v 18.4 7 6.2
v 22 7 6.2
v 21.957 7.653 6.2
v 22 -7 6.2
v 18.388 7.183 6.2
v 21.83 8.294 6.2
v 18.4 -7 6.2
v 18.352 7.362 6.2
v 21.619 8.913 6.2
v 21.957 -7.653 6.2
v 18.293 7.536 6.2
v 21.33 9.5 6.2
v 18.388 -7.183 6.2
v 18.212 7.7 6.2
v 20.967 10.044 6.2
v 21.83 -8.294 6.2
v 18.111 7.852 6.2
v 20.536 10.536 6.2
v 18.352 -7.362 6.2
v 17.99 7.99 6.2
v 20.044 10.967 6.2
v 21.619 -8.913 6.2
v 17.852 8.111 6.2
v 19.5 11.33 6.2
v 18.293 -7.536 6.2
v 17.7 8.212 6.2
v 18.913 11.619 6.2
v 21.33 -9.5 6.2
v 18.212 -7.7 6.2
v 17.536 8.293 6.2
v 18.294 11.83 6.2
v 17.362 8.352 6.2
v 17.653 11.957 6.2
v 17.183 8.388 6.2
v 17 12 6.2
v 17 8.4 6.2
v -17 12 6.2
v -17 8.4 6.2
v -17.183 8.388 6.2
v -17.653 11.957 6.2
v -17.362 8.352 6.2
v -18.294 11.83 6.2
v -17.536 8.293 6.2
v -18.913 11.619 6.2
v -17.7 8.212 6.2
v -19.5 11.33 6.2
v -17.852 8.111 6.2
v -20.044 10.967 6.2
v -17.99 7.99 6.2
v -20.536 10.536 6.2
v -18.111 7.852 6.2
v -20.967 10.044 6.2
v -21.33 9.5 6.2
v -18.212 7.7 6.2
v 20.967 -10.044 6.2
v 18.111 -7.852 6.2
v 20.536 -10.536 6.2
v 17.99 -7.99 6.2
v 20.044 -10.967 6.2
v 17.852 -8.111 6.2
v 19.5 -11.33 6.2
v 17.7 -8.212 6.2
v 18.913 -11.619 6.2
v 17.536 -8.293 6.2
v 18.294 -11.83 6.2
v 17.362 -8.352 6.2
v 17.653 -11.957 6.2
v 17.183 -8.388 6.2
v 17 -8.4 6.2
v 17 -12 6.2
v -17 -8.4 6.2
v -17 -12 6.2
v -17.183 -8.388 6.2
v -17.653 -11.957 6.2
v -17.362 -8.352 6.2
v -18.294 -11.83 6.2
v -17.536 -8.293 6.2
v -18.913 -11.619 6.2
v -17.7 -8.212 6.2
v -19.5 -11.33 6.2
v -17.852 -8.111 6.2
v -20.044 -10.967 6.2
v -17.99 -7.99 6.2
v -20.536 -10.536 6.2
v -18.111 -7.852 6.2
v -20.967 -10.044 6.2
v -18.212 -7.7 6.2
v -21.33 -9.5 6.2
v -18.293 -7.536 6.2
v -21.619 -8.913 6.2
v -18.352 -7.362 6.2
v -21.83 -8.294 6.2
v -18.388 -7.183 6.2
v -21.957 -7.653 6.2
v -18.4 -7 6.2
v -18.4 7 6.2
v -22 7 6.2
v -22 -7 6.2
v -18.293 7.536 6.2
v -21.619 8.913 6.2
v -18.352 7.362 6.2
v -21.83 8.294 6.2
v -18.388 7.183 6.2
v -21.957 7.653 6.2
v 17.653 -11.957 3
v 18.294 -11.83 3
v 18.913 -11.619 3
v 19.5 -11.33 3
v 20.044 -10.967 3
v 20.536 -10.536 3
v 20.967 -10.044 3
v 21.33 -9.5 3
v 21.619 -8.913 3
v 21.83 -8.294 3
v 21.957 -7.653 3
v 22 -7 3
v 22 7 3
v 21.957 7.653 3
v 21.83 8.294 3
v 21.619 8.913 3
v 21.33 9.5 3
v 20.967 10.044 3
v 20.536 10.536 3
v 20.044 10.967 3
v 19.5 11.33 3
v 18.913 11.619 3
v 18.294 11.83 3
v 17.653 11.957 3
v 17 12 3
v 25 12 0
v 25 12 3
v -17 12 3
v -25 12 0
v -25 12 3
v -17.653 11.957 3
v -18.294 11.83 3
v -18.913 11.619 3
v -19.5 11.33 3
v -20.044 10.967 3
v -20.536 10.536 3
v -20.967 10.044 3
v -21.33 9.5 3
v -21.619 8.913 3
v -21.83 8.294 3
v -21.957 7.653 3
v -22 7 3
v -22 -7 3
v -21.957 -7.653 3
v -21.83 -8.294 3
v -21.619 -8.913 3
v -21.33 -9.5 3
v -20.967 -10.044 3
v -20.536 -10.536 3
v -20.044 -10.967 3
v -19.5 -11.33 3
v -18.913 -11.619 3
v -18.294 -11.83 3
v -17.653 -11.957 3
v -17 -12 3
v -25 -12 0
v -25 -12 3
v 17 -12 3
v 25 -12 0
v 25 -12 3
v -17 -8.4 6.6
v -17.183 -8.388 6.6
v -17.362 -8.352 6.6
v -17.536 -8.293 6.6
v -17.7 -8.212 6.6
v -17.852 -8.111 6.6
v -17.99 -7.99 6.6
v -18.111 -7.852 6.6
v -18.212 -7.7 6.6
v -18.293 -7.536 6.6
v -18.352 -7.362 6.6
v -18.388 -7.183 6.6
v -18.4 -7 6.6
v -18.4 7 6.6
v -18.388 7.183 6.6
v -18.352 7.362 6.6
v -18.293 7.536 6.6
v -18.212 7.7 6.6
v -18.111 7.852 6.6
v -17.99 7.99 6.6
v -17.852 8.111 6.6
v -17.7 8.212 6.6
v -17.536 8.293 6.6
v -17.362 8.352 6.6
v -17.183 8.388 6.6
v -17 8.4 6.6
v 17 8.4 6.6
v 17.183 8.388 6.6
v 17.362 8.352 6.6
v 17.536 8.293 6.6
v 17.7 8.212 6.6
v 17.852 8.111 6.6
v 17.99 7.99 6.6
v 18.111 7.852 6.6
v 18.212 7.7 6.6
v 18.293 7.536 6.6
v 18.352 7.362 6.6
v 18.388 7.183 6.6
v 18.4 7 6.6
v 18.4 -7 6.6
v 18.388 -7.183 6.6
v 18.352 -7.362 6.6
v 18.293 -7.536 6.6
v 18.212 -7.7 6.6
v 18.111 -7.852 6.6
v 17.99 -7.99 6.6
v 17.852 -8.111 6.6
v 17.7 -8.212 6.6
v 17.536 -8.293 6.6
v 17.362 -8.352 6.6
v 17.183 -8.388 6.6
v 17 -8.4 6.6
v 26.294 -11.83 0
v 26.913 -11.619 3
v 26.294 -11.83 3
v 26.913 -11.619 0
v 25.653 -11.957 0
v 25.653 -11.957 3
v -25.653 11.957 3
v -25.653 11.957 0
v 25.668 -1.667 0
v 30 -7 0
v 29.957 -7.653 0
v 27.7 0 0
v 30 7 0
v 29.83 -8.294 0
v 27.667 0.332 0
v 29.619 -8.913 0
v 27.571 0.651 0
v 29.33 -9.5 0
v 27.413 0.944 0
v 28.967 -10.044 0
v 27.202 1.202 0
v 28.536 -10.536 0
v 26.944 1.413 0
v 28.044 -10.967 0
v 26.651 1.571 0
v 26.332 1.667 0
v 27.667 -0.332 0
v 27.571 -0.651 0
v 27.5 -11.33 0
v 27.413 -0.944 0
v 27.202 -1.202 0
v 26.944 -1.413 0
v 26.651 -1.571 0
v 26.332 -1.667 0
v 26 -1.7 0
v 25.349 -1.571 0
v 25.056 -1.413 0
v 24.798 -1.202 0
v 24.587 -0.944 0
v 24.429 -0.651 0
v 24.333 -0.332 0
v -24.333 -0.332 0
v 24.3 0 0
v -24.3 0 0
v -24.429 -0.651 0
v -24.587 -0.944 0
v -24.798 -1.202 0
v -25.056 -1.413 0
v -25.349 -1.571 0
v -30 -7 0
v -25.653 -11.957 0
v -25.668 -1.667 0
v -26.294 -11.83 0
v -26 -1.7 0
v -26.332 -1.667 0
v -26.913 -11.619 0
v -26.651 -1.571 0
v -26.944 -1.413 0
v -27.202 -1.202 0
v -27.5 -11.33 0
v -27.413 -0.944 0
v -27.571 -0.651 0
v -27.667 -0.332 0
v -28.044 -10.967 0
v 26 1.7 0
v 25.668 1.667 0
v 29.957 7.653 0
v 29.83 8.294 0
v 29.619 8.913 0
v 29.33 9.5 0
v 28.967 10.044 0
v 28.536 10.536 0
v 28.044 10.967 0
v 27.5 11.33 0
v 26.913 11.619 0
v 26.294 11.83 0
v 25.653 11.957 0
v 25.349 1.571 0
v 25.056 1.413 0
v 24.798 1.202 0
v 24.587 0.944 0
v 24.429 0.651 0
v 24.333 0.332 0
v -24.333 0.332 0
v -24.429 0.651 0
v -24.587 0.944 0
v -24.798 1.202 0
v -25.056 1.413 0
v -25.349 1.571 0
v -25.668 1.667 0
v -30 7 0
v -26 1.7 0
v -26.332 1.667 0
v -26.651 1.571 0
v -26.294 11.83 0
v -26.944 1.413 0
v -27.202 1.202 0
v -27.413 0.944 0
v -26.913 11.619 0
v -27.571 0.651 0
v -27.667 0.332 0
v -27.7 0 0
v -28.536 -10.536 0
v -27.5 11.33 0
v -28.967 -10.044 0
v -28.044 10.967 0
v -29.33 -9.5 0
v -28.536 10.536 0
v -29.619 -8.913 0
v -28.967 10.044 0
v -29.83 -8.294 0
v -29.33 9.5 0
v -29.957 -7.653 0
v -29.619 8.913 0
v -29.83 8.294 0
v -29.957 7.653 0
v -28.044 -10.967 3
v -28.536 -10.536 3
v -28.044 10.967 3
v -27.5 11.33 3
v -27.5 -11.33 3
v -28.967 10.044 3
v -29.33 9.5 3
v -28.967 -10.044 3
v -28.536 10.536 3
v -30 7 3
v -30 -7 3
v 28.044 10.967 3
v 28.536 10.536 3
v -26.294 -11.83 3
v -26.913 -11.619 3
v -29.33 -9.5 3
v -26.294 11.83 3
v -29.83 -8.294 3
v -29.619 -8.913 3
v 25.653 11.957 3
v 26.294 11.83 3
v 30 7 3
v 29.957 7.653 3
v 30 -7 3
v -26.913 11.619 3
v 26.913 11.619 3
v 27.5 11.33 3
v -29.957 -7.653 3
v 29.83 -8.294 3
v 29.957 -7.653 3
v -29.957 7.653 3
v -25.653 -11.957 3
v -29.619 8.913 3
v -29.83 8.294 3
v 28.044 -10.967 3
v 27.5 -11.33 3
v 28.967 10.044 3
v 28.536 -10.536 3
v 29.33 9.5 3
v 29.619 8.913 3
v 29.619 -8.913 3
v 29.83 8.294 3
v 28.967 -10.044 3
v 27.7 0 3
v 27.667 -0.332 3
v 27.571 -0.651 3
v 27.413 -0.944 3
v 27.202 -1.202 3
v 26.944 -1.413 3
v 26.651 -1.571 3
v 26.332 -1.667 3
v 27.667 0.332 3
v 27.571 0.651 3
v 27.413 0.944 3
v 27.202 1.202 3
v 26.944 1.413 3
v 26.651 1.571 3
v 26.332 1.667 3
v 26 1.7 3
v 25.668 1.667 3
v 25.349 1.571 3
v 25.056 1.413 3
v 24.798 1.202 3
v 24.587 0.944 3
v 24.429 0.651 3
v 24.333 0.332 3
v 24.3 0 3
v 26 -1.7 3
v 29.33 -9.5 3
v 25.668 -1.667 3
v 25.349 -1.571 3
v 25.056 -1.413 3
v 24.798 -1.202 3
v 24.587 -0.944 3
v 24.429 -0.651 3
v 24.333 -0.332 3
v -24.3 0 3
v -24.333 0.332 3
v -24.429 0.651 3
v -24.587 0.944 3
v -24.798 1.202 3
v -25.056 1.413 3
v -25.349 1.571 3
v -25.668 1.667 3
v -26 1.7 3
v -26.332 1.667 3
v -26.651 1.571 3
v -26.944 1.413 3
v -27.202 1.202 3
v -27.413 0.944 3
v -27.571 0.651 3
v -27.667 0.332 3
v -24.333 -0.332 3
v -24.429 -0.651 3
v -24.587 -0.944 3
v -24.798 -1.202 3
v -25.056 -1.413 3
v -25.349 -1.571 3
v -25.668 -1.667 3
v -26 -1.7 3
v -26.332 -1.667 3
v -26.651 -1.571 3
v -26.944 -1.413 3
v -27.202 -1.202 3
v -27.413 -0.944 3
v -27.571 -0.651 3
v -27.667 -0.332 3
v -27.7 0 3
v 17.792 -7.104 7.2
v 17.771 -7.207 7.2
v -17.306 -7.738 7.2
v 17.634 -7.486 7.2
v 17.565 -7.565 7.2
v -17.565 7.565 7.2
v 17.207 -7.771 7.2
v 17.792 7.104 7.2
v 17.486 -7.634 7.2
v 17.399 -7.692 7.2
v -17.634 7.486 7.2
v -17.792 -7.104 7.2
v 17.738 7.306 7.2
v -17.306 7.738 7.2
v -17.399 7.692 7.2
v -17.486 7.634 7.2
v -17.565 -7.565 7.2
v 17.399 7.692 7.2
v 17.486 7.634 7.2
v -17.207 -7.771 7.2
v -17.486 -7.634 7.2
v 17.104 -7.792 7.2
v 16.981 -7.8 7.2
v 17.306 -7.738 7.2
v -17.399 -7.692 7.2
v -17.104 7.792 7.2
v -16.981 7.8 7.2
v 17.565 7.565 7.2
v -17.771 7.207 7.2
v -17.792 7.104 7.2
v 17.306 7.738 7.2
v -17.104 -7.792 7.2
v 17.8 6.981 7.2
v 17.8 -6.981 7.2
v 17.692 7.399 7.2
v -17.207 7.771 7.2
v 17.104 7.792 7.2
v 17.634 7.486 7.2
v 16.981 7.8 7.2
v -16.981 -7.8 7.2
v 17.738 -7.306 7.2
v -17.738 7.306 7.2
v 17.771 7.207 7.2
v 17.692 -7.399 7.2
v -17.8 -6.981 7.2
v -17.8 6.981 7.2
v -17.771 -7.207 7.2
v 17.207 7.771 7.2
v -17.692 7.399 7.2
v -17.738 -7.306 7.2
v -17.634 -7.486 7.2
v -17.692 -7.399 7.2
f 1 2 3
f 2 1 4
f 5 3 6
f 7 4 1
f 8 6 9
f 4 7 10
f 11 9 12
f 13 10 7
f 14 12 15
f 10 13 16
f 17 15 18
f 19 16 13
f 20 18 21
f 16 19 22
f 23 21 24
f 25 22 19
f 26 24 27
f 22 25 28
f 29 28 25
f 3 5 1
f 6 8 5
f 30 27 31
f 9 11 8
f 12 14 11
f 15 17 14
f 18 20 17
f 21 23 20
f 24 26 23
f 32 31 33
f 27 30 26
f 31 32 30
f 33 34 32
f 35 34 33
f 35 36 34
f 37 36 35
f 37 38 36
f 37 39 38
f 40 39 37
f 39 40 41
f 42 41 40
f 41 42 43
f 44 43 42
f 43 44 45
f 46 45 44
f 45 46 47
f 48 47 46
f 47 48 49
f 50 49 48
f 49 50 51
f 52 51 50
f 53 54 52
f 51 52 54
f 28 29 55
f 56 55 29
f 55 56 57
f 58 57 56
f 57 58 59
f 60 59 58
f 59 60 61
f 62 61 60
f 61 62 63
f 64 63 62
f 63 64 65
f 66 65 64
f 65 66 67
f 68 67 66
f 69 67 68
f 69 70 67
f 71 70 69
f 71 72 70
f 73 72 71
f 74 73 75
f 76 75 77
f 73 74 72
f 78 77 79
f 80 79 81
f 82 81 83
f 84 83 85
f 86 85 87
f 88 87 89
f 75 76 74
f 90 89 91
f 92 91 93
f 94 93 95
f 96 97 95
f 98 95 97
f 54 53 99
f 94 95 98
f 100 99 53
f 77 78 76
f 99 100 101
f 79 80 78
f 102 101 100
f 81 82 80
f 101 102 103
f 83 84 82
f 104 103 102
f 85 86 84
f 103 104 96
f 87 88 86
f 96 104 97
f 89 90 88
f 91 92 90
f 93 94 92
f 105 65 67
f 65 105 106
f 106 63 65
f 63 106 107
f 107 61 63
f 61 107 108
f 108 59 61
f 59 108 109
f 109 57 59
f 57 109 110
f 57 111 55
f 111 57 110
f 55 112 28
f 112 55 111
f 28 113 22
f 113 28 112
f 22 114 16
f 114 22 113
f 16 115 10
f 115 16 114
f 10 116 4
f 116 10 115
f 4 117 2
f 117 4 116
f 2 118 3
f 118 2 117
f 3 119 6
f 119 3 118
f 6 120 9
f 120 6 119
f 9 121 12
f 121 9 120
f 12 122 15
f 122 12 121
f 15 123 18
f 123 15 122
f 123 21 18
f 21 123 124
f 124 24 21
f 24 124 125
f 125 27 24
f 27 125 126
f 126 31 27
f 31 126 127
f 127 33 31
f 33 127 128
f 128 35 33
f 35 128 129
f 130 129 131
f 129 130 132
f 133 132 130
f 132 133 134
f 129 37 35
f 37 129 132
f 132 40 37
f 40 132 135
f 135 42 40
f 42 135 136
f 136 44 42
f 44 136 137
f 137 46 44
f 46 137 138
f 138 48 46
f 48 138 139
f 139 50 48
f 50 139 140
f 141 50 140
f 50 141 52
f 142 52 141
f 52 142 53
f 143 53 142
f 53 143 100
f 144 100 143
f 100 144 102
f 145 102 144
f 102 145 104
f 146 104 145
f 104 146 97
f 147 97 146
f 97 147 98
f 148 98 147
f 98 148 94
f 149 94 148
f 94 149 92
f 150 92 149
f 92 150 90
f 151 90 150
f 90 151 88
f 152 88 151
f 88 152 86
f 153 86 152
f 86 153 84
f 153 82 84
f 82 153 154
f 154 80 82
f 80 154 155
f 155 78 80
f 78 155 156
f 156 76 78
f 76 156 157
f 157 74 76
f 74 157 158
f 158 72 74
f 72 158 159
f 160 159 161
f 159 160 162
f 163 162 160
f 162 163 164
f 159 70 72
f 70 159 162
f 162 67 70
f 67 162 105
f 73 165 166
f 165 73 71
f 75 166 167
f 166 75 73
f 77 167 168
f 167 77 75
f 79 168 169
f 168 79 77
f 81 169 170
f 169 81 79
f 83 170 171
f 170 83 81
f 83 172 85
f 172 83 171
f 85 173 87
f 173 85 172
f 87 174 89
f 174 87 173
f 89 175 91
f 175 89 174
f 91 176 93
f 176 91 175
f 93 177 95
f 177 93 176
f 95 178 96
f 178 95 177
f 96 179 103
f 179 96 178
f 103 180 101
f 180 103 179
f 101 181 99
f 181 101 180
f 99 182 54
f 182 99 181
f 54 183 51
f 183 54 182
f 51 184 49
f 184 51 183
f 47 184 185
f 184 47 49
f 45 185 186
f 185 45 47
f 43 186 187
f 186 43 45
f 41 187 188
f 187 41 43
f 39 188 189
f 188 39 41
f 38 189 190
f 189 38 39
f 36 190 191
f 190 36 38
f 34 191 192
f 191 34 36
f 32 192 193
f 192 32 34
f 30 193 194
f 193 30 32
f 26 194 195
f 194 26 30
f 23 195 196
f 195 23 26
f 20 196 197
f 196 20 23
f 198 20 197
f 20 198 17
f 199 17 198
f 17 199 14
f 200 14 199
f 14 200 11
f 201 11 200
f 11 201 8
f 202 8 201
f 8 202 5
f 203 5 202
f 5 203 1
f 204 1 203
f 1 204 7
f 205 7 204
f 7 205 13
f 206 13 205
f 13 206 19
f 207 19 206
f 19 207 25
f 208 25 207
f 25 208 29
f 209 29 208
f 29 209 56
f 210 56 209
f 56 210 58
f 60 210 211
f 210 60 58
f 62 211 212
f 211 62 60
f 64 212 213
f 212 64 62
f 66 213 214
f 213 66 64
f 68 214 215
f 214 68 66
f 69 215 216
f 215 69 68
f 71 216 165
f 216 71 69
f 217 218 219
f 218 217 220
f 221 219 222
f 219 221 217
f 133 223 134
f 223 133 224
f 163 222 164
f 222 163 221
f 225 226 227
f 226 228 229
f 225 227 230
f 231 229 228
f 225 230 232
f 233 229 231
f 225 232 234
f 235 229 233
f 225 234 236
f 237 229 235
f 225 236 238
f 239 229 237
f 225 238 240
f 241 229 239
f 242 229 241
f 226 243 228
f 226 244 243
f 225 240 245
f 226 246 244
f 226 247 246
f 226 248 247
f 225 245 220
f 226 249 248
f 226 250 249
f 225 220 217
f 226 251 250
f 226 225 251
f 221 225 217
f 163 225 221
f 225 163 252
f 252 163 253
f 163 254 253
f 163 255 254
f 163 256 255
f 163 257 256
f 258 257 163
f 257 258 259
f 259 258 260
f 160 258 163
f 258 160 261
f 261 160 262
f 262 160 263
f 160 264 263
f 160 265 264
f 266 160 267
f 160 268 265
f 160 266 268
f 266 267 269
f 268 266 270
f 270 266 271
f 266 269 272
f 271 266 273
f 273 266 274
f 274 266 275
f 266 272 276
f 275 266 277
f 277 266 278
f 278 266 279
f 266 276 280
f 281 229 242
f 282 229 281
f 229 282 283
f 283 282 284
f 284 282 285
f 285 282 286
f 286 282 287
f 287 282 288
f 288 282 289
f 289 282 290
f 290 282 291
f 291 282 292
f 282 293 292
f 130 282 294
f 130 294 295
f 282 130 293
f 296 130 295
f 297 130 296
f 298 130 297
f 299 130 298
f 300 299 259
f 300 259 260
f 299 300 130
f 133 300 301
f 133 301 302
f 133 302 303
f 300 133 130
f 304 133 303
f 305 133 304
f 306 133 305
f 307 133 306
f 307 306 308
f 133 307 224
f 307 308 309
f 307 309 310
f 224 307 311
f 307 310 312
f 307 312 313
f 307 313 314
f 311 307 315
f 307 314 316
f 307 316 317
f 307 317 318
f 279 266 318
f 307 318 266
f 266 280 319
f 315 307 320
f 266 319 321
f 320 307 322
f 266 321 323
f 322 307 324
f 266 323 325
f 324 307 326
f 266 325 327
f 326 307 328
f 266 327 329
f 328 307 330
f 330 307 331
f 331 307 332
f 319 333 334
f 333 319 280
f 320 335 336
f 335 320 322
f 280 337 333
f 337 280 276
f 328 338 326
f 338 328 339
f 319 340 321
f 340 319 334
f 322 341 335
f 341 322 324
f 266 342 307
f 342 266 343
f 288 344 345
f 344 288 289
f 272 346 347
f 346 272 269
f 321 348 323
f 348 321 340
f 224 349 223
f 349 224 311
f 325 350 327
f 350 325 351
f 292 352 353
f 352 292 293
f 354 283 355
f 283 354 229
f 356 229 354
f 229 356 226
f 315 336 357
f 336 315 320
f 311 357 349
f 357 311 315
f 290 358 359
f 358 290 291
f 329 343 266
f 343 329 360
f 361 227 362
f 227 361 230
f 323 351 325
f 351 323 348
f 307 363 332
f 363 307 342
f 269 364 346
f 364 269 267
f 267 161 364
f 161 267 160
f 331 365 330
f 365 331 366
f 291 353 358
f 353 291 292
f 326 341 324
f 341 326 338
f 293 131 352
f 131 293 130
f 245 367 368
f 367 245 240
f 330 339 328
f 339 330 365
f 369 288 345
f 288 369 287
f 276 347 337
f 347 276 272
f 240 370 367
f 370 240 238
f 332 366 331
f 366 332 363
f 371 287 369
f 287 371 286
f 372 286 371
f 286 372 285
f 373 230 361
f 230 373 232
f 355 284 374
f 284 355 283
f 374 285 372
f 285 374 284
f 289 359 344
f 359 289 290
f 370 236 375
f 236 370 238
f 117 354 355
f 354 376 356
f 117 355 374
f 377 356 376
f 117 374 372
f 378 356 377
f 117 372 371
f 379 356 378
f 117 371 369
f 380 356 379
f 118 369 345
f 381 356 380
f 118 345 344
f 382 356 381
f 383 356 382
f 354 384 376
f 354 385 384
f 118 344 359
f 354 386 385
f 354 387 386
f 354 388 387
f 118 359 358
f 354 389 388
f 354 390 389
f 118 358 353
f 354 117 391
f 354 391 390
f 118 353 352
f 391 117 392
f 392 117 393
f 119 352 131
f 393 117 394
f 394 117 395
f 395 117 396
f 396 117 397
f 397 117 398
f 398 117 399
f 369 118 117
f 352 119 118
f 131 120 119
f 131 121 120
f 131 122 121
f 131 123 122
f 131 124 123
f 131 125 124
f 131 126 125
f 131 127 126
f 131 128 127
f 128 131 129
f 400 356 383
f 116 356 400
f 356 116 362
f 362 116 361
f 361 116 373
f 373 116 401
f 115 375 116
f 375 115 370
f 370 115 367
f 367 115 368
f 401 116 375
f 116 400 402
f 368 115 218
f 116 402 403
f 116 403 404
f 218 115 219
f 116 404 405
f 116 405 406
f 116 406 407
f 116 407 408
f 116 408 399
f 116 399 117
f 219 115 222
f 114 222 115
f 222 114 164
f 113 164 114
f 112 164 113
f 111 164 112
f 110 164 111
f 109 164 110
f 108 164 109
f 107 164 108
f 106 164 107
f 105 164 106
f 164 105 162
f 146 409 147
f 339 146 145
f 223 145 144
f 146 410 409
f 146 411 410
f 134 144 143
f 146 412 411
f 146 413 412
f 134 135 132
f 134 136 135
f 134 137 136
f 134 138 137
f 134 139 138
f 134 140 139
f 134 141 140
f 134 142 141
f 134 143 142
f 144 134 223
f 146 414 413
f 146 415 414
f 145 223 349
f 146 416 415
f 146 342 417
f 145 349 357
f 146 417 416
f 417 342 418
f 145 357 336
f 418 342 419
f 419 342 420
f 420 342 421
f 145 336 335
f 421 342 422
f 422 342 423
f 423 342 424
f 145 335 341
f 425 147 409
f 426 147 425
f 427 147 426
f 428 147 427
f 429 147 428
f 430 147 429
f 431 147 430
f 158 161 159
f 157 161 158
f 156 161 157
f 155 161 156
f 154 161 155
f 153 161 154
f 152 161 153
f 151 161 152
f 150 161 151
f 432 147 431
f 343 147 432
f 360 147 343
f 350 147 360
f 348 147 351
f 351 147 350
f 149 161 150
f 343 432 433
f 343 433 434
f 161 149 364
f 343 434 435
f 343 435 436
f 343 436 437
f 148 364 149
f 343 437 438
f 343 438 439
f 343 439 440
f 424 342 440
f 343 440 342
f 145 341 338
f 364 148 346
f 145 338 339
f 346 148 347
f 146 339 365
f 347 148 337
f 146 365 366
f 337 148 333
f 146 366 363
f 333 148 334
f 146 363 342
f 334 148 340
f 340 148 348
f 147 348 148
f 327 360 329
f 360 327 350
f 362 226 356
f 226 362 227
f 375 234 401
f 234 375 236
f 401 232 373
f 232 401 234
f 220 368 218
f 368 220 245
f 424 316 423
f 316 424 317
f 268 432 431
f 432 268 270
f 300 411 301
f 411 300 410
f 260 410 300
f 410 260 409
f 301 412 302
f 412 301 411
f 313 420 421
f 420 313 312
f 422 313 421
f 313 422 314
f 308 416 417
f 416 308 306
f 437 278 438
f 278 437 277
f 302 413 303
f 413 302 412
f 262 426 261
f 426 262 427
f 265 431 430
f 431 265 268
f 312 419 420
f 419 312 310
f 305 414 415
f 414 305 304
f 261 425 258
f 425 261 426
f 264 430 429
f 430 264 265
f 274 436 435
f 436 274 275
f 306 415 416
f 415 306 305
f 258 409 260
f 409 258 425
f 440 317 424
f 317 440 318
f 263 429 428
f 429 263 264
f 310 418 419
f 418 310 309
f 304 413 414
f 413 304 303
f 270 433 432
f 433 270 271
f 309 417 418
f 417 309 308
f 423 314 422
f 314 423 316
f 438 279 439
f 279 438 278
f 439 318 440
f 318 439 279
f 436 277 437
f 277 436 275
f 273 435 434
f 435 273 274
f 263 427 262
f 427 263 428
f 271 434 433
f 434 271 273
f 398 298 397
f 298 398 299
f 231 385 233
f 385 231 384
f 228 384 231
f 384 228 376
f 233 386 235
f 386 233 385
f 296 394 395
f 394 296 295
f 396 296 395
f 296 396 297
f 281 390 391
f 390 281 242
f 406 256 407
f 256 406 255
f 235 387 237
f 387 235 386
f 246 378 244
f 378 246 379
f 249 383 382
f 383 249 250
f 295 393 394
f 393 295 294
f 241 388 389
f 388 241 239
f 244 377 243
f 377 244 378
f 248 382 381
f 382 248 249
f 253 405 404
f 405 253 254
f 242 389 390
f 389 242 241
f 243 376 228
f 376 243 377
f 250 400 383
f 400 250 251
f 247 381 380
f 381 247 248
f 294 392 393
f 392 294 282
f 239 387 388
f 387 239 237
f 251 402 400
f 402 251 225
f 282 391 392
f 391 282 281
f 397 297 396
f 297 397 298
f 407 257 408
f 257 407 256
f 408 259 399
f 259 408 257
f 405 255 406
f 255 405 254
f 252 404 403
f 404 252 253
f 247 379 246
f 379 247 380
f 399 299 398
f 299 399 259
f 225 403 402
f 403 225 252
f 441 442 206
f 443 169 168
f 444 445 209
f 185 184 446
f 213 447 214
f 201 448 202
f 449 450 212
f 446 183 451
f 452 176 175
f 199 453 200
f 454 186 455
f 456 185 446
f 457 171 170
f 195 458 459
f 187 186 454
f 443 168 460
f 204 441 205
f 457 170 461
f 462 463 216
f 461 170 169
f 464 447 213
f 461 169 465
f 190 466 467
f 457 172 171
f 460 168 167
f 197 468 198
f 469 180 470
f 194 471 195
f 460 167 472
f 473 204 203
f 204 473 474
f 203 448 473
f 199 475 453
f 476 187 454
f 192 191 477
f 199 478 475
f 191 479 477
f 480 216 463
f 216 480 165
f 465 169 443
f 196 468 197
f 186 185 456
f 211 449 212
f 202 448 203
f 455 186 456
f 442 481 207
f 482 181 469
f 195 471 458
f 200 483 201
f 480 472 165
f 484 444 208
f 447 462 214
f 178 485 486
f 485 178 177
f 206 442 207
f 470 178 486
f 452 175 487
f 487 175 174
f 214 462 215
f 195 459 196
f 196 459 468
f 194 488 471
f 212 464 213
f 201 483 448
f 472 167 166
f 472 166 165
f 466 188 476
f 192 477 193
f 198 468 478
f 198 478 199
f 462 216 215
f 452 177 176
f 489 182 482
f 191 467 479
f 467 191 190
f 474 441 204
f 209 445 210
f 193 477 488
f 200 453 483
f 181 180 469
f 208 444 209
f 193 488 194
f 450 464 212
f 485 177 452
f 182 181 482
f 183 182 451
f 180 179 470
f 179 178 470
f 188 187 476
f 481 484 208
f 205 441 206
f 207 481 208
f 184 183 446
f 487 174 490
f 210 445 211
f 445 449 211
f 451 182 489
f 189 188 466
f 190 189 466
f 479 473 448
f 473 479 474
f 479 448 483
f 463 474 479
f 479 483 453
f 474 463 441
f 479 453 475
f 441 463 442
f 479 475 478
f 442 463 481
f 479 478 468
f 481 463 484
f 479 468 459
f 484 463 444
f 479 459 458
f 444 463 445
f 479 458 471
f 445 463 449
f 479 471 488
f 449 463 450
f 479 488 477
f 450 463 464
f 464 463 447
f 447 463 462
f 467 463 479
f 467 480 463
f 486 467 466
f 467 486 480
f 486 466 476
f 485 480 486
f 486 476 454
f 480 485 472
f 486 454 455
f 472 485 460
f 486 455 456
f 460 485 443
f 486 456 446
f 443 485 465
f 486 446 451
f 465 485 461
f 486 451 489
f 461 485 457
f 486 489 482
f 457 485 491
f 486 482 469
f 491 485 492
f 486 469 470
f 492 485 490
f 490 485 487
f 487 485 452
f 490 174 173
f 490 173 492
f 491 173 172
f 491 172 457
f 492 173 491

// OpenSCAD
// file: ../params.scad
// Shared settings for PETG + TPU hybrid parts (Bambu Lab H2D, 0.4 mm nozzles)
// -----------------------------------------------------------------------
// Conventions used by every block in blocks/:
//  - millimetres; Z is the print direction (the build plate is z = 0);
//  - every block is a module with a `part` argument:
//      "petg" -> the PETG body only, "tpu" -> the TPU body only,
//      "both" -> both, coloured, for previews;
//  - the TPU body is always (TPU region) minus (PETG body), so the two share
//    exact faces and never overlap;
//  - every PETG/TPU interface is held by shape, not by adhesion: the TPU
//    must not be able to slide out of the PETG in any direction
//    (tools/capture_check.py tests this).

layer_h = 0.2;
line_w = 0.42;            // extrusion width
min_tpu = 1.2;            // thinnest TPU wall: 3 lines
min_petg = 1.2;           // thinnest PETG wall: 3 lines
xy_clear = 0.4;           // side clearance between separate moving parts
z_clear = 0.6;            // empty layers between stacked moving parts (3 x 0.2)

// anchor features (PETG reaching into TPU)
anchor_neck = 1.3;        // dovetail neck at the PETG surface
anchor_head = 2.3;        // dovetail head inside the TPU
anchor_depth = 1.2;
anchor_gap_z = 1.2;       // TPU-filled breaks along a rib, so the TPU also wraps over it
rivet_d = 2.4;            // holes through PETG that TPU fills

petg_colour = "#3b6e9c";
tpu_colour = "#e2572b";
eps = 0.01;

// Show/return one material. Children: child(0) = PETG body, child(1) = TPU region.
module hybrid(part) {
    if (part == "petg") children(0);
    else if (part == "tpu") difference() { children(1); children(0); }
    else {
        color(petg_colour) children(0);
        color(tpu_colour) difference() { children(1); children(0); }
    }
}
// main file
include <../params.scad>
// =======================================================================
// skin_anchor: a TPU skin / pad on a PETG surface that cannot peel off
// =======================================================================
// WHAT IT IS FOR
//   Grippy feet, bumpers, gripper-finger pads, anti-slip linings and
//   protective skins on a PETG robot chassis or drone frame, printed in the
//   same print as the PETG (H2D: PETG left nozzle, TPU 95A right nozzle).
//   PETG and TPU do not reliably stick to each other, so the pad is held by
//   SHAPE ONLY - it would stay put with zero adhesion.
//
// HOW IT WORKS (vertical section through one edge of the pad)
//
//                    proud TPU (contact face), top edge chamfered by ch
//           lip_w    ___________________________________________
//          |<--->|  /
//   +------+-----+-/ - - - - - - - - - - - - - - - - - - - - - -  rim top
//   |  rim |  lip|        TPU                     <- lip (lip_t) printed ON the TPU
//   |      +-----+      ______         ______         ______
//   |      |            \    /         \    /         \    /   <- dovetail ribs (rib_h):
//   |      |     TPU     \__/    TPU    \__/    TPU    \__/       wide head, narrow neck
//   +======+===================================================  PETG face (z = 0)
//    rim_w     skin_t = TPU height from the face up to the lip
//
//   (a) RIM + LIP: a PETG wall around the pad; its top layers reach inwards
//       over the TPU edge by lip_w. The lip is printed on top of the TPU,
//       which supports it (no bridge, no support). The TPU flange under the
//       lip cannot lift, and the rim walls stop it sliding sideways.
//   (b) DOVETAIL RIBS: PETG ribs stand up from the face into the TPU, narrow
//       at the face (neck) and wide at the top (head), so the TPU between
//       them is a dovetail key that cannot lift. The ribs are broken into
//       segments with TPU-filled gaps, staggered row to row (brick pattern),
//       so the TPU also wraps over and between them and cannot slide along
//       them. They hold the middle of the pad down, so a peel that starts at
//       an edge has to tear TPU at every rib it reaches.
//   The TPU body is (TPU region) minus (PETG), so the faces match exactly.
//   tools/check_block.py confirms the rigid TPU body cannot slide out in any
//   of 26 directions. Each feature also captures the pad on its own (checked
//   with ribs = false, and with the lip cut away), so either one is a backup
//   for the other. Pictures: images/skin_anchor.png (demo),
//   images/skin_anchor_section.png (quarter cut-away: lip and ribs),
//   images/skin_anchor_test.png (peel coupon).
//
// PUBLIC MODULES (all sizes in mm; pad centred on x = y = 0)
//   skin_pad(part, size, base_t, ...)
//       Complete part: PETG plate (z = 0 .. base_t) with the pad on its top
//       face, optional plate margin and screw holes.
//   skin_anchor(part, size, ...)
//       The pad alone with its rim/lip/ribs, standing on z = 0. Put it on any
//       flat, upward-facing PETG face of your own part:
//           if (part != "tpu") my_body();          // top face at z = h
//           translate([x, y, h]) skin_anchor(part, [30, 15]);
//       (its PETG reaches eps below z = 0 so it fuses with your body; the TPU
//       starts at z = 0, so it never overlaps a body that ends at z <= h).
//   skin_anchor_petg(size, ...)   raw PETG geometry (rim + lip + ribs)
//   skin_tpu_region(size, ...)    raw TPU region (pocket + proud pad)
//       Geometry helpers for params.scad's hybrid(), so they take no `part`:
//           hybrid(part) {
//               union() { my_body(); translate(p) skin_anchor_petg(s); }  // PETG
//               translate(p) skin_tpu_region(s);                         // TPU
//           }
//       Recessed (flush) variant: cut the pocket into a thick body first:
//               union() { difference() { my_body(); translate(p) skin_tpu_region(s); }
//                         translate(p) skin_anchor_petg(s); }
//       (p = a point on the pocket floor, skin_t + lip_t below the body's
//       flat top face; the body itself becomes the rim and lip.)
//   Your face must be flat and at least size + 2 * rim_w across, or the rim
//   would hang over its edge (and start in mid-air).
//   skin_peel_coupon(part, ...)
//       Test piece comparable to bond_tests coupon P: same 12 mm wide,
//       35 mm long pad, a 1.6 mm TPU tail down the plate end and along the
//       bed, 6 mm holes in the plate and the tail. Clamp the plate, pull the
//       tail straight up with a luggage scale, note the peak reading and how
//       it failed; compare with P (bonded only).
//
// PARAMETERS (same names in every module; defaults in brackets)
//   size      [40, 20]  pad footprint inside the rim = TPU area on the PETG
//                       face. Any size >= ~10 x 10; ribs fill what fits.
//   base_t    3         PETG plate thickness (skin_pad / coupon only);
//                       15 layers, stiff enough not to bend when peeled.
//   skin_t    2.0       TPU thickness under the lip (pocket depth, face to
//                       lip). Rule: >= rib_h + 0.6 (3 TPU layers over the
//                       ribs) and >= min_tpu.
//   lip_t     1.2       lip thickness = min_petg (6 layers). Lip strength
//                       goes with lip_t^2 (see estimate below).
//   lip_w     1.6       how far the lip reaches over the TPU edge (4 lines).
//                       More = harder to squeeze the TPU out, but the lip
//                       bends open more easily (strength ~ 1 / lip_w) and
//                       less TPU shows.
//   rim_w     2.0       PETG rim wall width, >= min_petg (5 lines). It also
//                       carries the lip load down to the face across layers.
//   proud     1.0       TPU standing above the rim top (the contact face).
//                       0 = skin flush with the rim. >= 0.6 if used.
//   ch        0.6       45 deg chamfer on the top edge of the proud TPU, so
//                       edges do not catch and start a peel (clamped to proud).
//   r         3         pocket corner radius; the rim outside is r + rim_w,
//                       the lip opening r - lip_w (keep r >= lip_w).
//   rib_h     anchor_depth (1.2)   rib height above the face.
//   rib_neck  anchor_neck (1.3)    rib width at the face (>= min_petg).
//   rib_head  anchor_head (2.3)    rib width at the top. Flank overhang
//                       atan((head - neck) / 2 / rib_h) = 23 deg (<= 45).
//   rib_pitch 4.0       spacing of the rib rows. Rule: pitch - head >=
//                       min_tpu, so the TPU key between heads is >= 3 lines
//                       (default 1.7 mm); the key is 2.7 mm wide at the face.
//   seg_l     5.0       rib segment length along the rib (>= 2).
//   rib_gap   1.6       TPU gap between segments (>= anchor_gap_z = 1.2;
//                       1.6 gives each TPU post 4 lines). Odd rows are
//                       shifted half a period (brick pattern).
//   rib_inset 2.0       clear TPU between the pocket wall and the ribs
//                       (>= min_tpu; about lip_w, so ribs begin where the
//                       lip stops and the flange under the lip stays skin_t).
//                       Each row is cut short where the pocket corners round
//                       off, so rib ends stay square (no thin wedges).
//   ribs      true      false = rim + lip only (tiny pads, thin strips).
//   rib_dir   "auto"    direction the ribs run: "x", "y", or "auto" = along
//                       the longer side of the pad (long segments; a narrow
//                       pad with ribs across it gets only short stubs).
//   skin_pad only:  margin 0 (scalar or [x, y]) extra plate outside the rim;
//                   holes [] list of [x, y] hole centres; each must sit in
//                   the margin, clear of the rim and >= min_petg from the
//                   plate edge (asserted: a hole that touches the rim would
//                   undercut it and leave the rim bridging over the hole);
//                   hole_d 3.4 (M3 clearance). The pad (rim + proud TPU,
//                   4.2 mm) stands taller than an M3 head, so a foot can
//                   be screwed on through the margin.
//   coupon only:    grip_l 15 (plate before the pad, holds the 6 mm hole),
//                   tab_t 1.6 and tab_w = size.y (as coupon P), tail_l 40,
//                   tab_overlap 8 (tab fused onto the pad top), tab_wall 2
//                   (TPU wall down the plate end), hole_d 6.
//
// STIFFNESS / STRENGTH ESTIMATE (defaults, 40 x 20 pad; hand formulas)
//   TPU 95A: E ~ 26 MPa, G ~ 9 MPa; printed tensile strength assumed
//   ~ 20 MPa (conservative). PETG: E ~ 2000 MPa, ~ 45 MPa along the
//   extrusion lines; ~ 30 MPa assumed ACROSS lines or layers.
//   Contact area A = lip opening ~ 36.8 x 16.8 ~ 615 mm^2;
//   TPU above the rib tops t = skin_t - rib_h + lip_t + proud = 3.0 mm.
//   * Shear (foot pushed sideways): with no adhesion the TPU above the rib
//     tops shears: k_s = G A / t = 9 * 615 / 3.0 ~ 1.8 kN/mm
//     -> 10 N sideways moves the face ~ 5 um.
//   * Compression: k_c >= E A / t_total = 26 * 615 / 4.2 ~ 3.8 kN/mm (lower
//     bound; the pocket confines the TPU, so the real value is higher).
//     => the pad is for GRIP and impact/scuff protection, not suspension
//     travel. Use a TPU spring block for compliance.
//   * Lip + rim (the edge hold, and the weakest part). Lifting the pad presses
//     the TPU flange up under the lip; in a peel the push sits near the lip
//     tip. The lip is a PETG cantilever whose bending stress runs across the
//     extrusion lines of each layer (sigma ~ 30 MPa):
//       load at the tip:  F' = sigma lip_t^2 / (6 lip_w) = 30*1.44/9.6 ~ 4.5 N/mm
//       load spread out:  F' = sigma lip_t^2 / (3 lip_w)                ~ 9 N/mm
//     The rim wall takes that force and its moment down to the face ACROSS
//     layers: sigma = F'/rim_w + 6 F' (rim_w/2 + lip_w)/rim_w^2 = 4.4 F'
//     -> F' ~ 30 / 4.4 ~ 7 N/mm, so lip and rim are matched. The TPU flange
//     (2 mm thick) squeezing out round the lip tip needs about the same
//     (it has to bend ~90 deg round a ~1 mm radius, ~ 100 % strain).
//     => an edge lets go at ~ 5 - 9 N per mm of edge: ~ 55 - 110 N on the
//     coupon's 12 mm end, ~ 160 - 330 N along one long side of the default
//     pad. Raising lip_t to 1.6 helps the lip (x 1.8) only if rim_w goes up
//     too (rim_w 2.4: x 1.3).
//   * Impact on the pad: the confined TPU pressurises the pocket, p ~ F / A,
//     and pushes the lip up with p * lip_w per mm. With the spread-out limit
//     of ~ 9 N/mm: p ~ 5.6 MPa, i.e. ~ 3.4 kN on the default pad.
//   * Rib keys (the main hold in the middle). To lift the skin, the TPU key
//     between two rib heads must tear at its narrow top, F' ~ sigma_TPU *
//     (pitch - head) = 20 * 1.7 ~ 34 N/mm of row, or be squeezed from 2.7 to
//     1.7 mm (37 % strain) to pop out past the 23 deg flanks: a wedge
//     estimate with mu ~ 0.3 gives ~ 30 N/mm. With the gaps
//     (seg_l / (seg_l + rib_gap) = 0.76): ~ 25 N per mm of row. The PETG
//     rib neck, pulled across layers, carries ~ 30 * 1.3 ~ 39 N/mm.
//     So the ribs hold ~ 4x more per mm than the edge: a peel that beats the
//     lip edge should stall at the first rib row, ~ 3 mm in.
//   * Coupon tail: 12 x 1.6 mm TPU at 20 MPa ~ 380 N, and it stretches a
//     lot before that. Expect the pad's far edge to let go first (~ 55 -
//     110 N, by the lip bending up or the flange squeezing out), then the
//     ribs to hold. Coupon P measures the bonded-only peel of the same
//     12 mm strip, which the owner found unreliable.
//   These are hand estimates: the TPU deforms a lot, so measure with the
//   coupon before you rely on a number.
//
// RECOMMENDED USES
//   Rover: feet / skid pads under the chassis, bumper faces on the nose and
//   corners, anti-slip lining in battery or payload trays, gripper pads.
//   Drone: landing-gear foot pads, belly skid plate, arm-tip bumpers, soft
//   battery-strap seats. Make the face whose pad you want point UP (+z) in
//   the print orientation. Run the ribs across the main peel direction
//   when you can: then a peel crosses each rib row in turn.
//
// PRINTING / RULES THIS BLOCK FOLLOWS
//   No supports. The lip's first layer is printed on the TPU (it sticks
//   poorly to it, which does not matter). Rib flanks overhang 23 deg. Every
//   wall >= 1.2 mm, every TPU gap >= 1.2 mm. Every layer from the face to
//   the rim top holds both materials -> about one nozzle change per layer
//   (the slicer alternates the order) over (skin_t + lip_t) / 0.2 = 16
//   layers with the defaults (PrusaSlicer test: 19 changes for the demo).
//   Slicer: print the TPU pad with 100 % infill (or enough walls to fill
//   it). The keys between the ribs and the flange under the lip must be
//   solid TPU, because sparse infill there lets an elastomer pull out easily.
//   With "interface shells" off (the PrusaSlicer / Bambu Studio default),
//   TPU printed on PETG is not a bottom surface, so the slicer would not
//   make those layers solid by itself. PETG: >= 3 walls, so the rim and lip
//   are solid.
//
// LIMITATIONS
//   * Flat, rounded-rectangle pads on an upward-facing (+z) face only. Pads
//     on side walls or on the bed-facing side need a different anchor
//     (a lip there would be a PETG overhang without TPU under it).
//   * Ribs are straight rows along x or y (rib_dir); there is no rib grid.
//   * The rim stands rim_w around and skin_t + lip_t above the face; the
//     usable TPU face is the lip opening, size - 2 * lip_w.
//   * The checker tests rigid capture only, not soft pull-out. The edge
//     (lip) hold is modest (~ 5 - 9 N/mm, see above): a hard peel can lift
//     the outer ~ 3 mm before the ribs take over. Test with the coupon.
//   * skin_pad checks that holes are clear of the rim and the straight plate
//     edges, but not the rounded plate corners.
//   * Thin pads (skin_t < rib_h + 0.6) are refused: use ribs = false.
// =======================================================================

part = "both";   // [petg, tpu, both]
show = "demo";   // [demo, test]

skin_fn = 48;

// -----------------------------------------------------------------------
// 2D helpers
// -----------------------------------------------------------------------
module _skin_rrect(s, r) {
    if (r > 0.01) offset(r = r, $fn = skin_fn) square([s[0] - 2 * r, s[1] - 2 * r], center = true);
    else square(s, center = true);
}
module _skin_pocket_2d(size, r) _skin_rrect(size, r);
module _skin_opening_2d(size, lip_w, r) _skin_rrect(size - [2, 2] * lip_w, max(r - lip_w, 0));
module _skin_outer_2d(size, rim_w, r) _skin_rrect(size + [2, 2] * rim_w, r + rim_w);

// rib rows (y positions), centred, heads kept inside the pocket by rib_inset
// (sz = pocket size in the rib frame: ribs run along sz.x)
function _skin_rows(sz, rib_inset, rib_head, rib_pitch) =
    let(span = sz[1] - 2 * rib_inset - rib_head,
        n = span < 0 ? 0 : floor(span / rib_pitch + 1e-6) + 1)
    n == 0 ? [] : [for (j = [0 : n - 1]) (j - (n - 1) / 2) * rib_pitch];

// half-length available to a row whose head edge is at |y| = yy, inside the
// pocket inset by rib_inset (its corners are rounded r - rib_inset), so the
// rib ends stay square instead of being shaved into thin wedges at corners
function _skin_row_xl(sz, r, rib_inset, yy) =
    let(X = sz[0] / 2 - rib_inset, Y = sz[1] / 2 - rib_inset, rc = max(r - rib_inset, 0),
        d = yy - (Y - rc))
    d <= 0 ? X : X - rc + sqrt(max(rc * rc - d * d, 0));

// rib segments [x0, x1] of one row; o = stagger offset; pieces < 2 mm dropped
function _skin_segs(xl, seg_l, gap, o) =
    let(P = seg_l + gap, kmax = ceil((xl + seg_l) / P) + 1)
    [for (k = [-kmax : kmax])
        let(c = o + k * P, a = max(c - seg_l / 2, -xl), b = min(c + seg_l / 2, xl))
        if (b - a >= 2.0) [a, b]];

// do the ribs run along y? ("auto": along the longer side of the pad)
function _skin_ribs_y(size, rib_dir) = rib_dir == "y" || (rib_dir == "auto" && size[1] > size[0]);

// one dovetail rib segment along x (narrow neck at z = 0, wide head on top)
module _skin_rib(a, b, y, neck, head, h)
    translate([a, y, 0]) rotate([90, 0, 90]) linear_extrude(b - a)
        polygon([[-neck / 2, -eps], [neck / 2, -eps], [head / 2, h], [-head / 2, h]]);

module _skin_checks(size, skin_t, lip_t, lip_w, rim_w, proud, ch, r,
                    rib_h, rib_neck, rib_head, rib_pitch, seg_l, rib_gap, rib_inset, ribs, rib_dir) {
    assert(rib_dir == "auto" || rib_dir == "x" || rib_dir == "y", "rib_dir must be \"auto\", \"x\" or \"y\"");
    assert(skin_t >= min_tpu, "skin_t must be >= min_tpu (1.2 mm)");
    assert(!ribs || skin_t >= rib_h + 3 * layer_h - 1e-6,
           "skin_t must leave >= 3 TPU layers over the ribs (skin_t >= rib_h + 0.6), or set ribs = false");
    assert(lip_t >= 3 * layer_h - 1e-6, "lip_t must be >= 3 layers");
    assert(rim_w >= min_petg - 1e-6, "rim_w must be >= min_petg");
    assert(lip_w > 0 && min(size[0], size[1]) - 2 * lip_w >= min_tpu, "lip opening too small: size - 2 * lip_w < min_tpu");
    assert(r >= 0 && 2 * r < min(size[0], size[1]), "corner radius r too large for size");
    assert(proud >= 0 && ch >= 0, "need proud >= 0 and ch >= 0");
    assert(!ribs || rib_neck >= min_petg - 1e-6, "rib_neck must be >= min_petg");
    assert(!ribs || atan((rib_head - rib_neck) / 2 / rib_h) <= 45, "rib flank overhang > 45 deg");
    assert(!ribs || rib_pitch - rib_head >= min_tpu - 1e-6, "TPU key between rib heads < min_tpu: raise rib_pitch");
    assert(!ribs || rib_gap >= anchor_gap_z - 1e-6, "rib_gap must be >= anchor_gap_z");
    assert(!ribs || rib_inset >= min_tpu - 1e-6, "rib_inset must be >= min_tpu");
    assert(!ribs || seg_l >= 2.0, "seg_l must be >= 2 mm (shorter rib segments are dropped)");
}

// -----------------------------------------------------------------------
// Raw geometry helpers (children for hybrid(); no `part` argument)
// -----------------------------------------------------------------------
// PETG anchor features on a face at z = 0: rim, lip over the TPU, ribs.
module skin_anchor_petg(size = [40, 20], skin_t = 2.0, lip_t = 1.2, lip_w = 1.6, rim_w = 2.0,
                        proud = 1.0, ch = 0.6, r = 3,
                        rib_h = anchor_depth, rib_neck = anchor_neck, rib_head = anchor_head,
                        rib_pitch = 4.0, seg_l = 5.0, rib_gap = 1.6, rib_inset = 2.0, ribs = true,
                        rib_dir = "auto") {
    _skin_checks(size, skin_t, lip_t, lip_w, rim_w, proud, ch, r,
                 rib_h, rib_neck, rib_head, rib_pitch, seg_l, rib_gap, rib_inset, ribs, rib_dir);
    H = skin_t + lip_t;
    // rim wall
    translate([0, 0, -eps]) linear_extrude(H + eps) difference() {
        _skin_outer_2d(size, rim_w, r);
        _skin_pocket_2d(size, r);
    }
    // lip: the top lip_t of the rim reaches lip_w over the TPU
    translate([0, 0, skin_t]) linear_extrude(lip_t) difference() {
        _skin_outer_2d(size, rim_w, r);
        _skin_opening_2d(size, lip_w, r);
    }
    // staggered dovetail rib segments, kept rib_inset clear of the pocket wall
    // (each row is cut to the length that fits, so the ends stay square)
    if (ribs) {
        ay = _skin_ribs_y(size, rib_dir);
        sz = ay ? [size[1], size[0]] : size;
        rows = _skin_rows(sz, rib_inset, rib_head, rib_pitch);
        if (len(rows) > 0) rotate([0, 0, ay ? 90 : 0])
            for (j = [0 : len(rows) - 1])
                let(xl = _skin_row_xl(sz, r, rib_inset, abs(rows[j]) + rib_head / 2))
                for (s = _skin_segs(xl, seg_l, rib_gap, (j % 2) * (seg_l + rib_gap) / 2))
                    _skin_rib(s[0], s[1], rows[j], rib_neck, rib_head, rib_h);
    }
}

// TPU region on a face at z = 0: the pocket under the lip, the lip opening,
// and the proud contact pad with a chamfered top edge. (The rib parameters
// are accepted, and ignored, so both helpers take the same argument list.)
module skin_tpu_region(size = [40, 20], skin_t = 2.0, lip_t = 1.2, lip_w = 1.6, rim_w = 2.0,
                       proud = 1.0, ch = 0.6, r = 3,
                       rib_h = anchor_depth, rib_neck = anchor_neck, rib_head = anchor_head,
                       rib_pitch = 4.0, seg_l = 5.0, rib_gap = 1.6, rib_inset = 2.0, ribs = true,
                       rib_dir = "auto") {
    H = skin_t + lip_t;
    linear_extrude(skin_t) _skin_pocket_2d(size, r);                  // under the lip
    translate([0, 0, skin_t - eps]) linear_extrude(lip_t + 2 * eps)   // through the lip opening
        _skin_opening_2d(size, lip_w, r);
    if (proud > 0) translate([0, 0, H - eps]) {
        c = min(ch, proud);
        if (c > 0) hull() {
            linear_extrude(proud - c + eps) _skin_opening_2d(size, lip_w, r);
            linear_extrude(proud + eps) offset(delta = -c) _skin_opening_2d(size, lip_w, r);
        }
        else linear_extrude(proud + eps) _skin_opening_2d(size, lip_w, r);
    }
}

// -----------------------------------------------------------------------
// Public block modules
// -----------------------------------------------------------------------
// The pad alone (rim + lip + ribs + TPU), standing on a face at z = 0.
module skin_anchor(part, size = [40, 20], skin_t = 2.0, lip_t = 1.2, lip_w = 1.6, rim_w = 2.0,
                   proud = 1.0, ch = 0.6, r = 3,
                   rib_h = anchor_depth, rib_neck = anchor_neck, rib_head = anchor_head,
                   rib_pitch = 4.0, seg_l = 5.0, rib_gap = 1.6, rib_inset = 2.0, ribs = true,
                   rib_dir = "auto")
    hybrid(part) {
        skin_anchor_petg(size = size, skin_t = skin_t, lip_t = lip_t, lip_w = lip_w, rim_w = rim_w,
                         proud = proud, ch = ch, r = r, rib_h = rib_h, rib_neck = rib_neck,
                         rib_head = rib_head, rib_pitch = rib_pitch, seg_l = seg_l, rib_gap = rib_gap,
                         rib_inset = rib_inset, ribs = ribs, rib_dir = rib_dir);
        skin_tpu_region(size = size, skin_t = skin_t, lip_t = lip_t, lip_w = lip_w, rim_w = rim_w,
                        proud = proud, ch = ch, r = r);
    }

// PETG plate (z = 0 .. base_t) with a captured TPU pad on its top face.
module skin_pad(part, size = [40, 20], base_t = 3, skin_t = 2.0, lip_t = 1.2, lip_w = 1.6, rim_w = 2.0,
                proud = 1.0, ch = 0.6, r = 3,
                rib_h = anchor_depth, rib_neck = anchor_neck, rib_head = anchor_head,
                rib_pitch = 4.0, seg_l = 5.0, rib_gap = 1.6, rib_inset = 2.0, ribs = true,
                margin = 0, holes = [], hole_d = 3.4, rib_dir = "auto") {
    m = is_list(margin) ? margin : [margin, margin];
    R = [size[0] / 2 + rim_w, size[1] / 2 + rim_w];      // rim outside (half sizes)
    Q = R + m;                                           // plate (half sizes)
    assert(base_t >= min_petg, "base_t must be >= min_petg");
    assert(hole_d >= 1.6, "holes must be >= 1.6 mm");
    // a hole must sit in the margin: clear of the rim (else it undercuts the
    // rim and leaves it bridging over the hole) and min_petg from the plate edge
    for (h = holes) {
        assert(abs(h[0]) - hole_d / 2 >= R[0] - 1e-6 || abs(h[1]) - hole_d / 2 >= R[1] - 1e-6,
               str("hole at ", h, " is under the rim: put holes in the margin"));
        assert(abs(h[0]) + hole_d / 2 + min_petg <= Q[0] + 1e-6 && abs(h[1]) + hole_d / 2 + min_petg <= Q[1] + 1e-6,
               str("hole at ", h, " leaves < min_petg to the plate edge: widen the margin"));
    }
    hybrid(part) {
        difference() {
            union() {
                linear_extrude(base_t)
                    _skin_rrect(2 * Q, r + rim_w + min(m[0], m[1]));
                translate([0, 0, base_t])
                    skin_anchor_petg(size = size, skin_t = skin_t, lip_t = lip_t, lip_w = lip_w, rim_w = rim_w,
                                     proud = proud, ch = ch, r = r, rib_h = rib_h, rib_neck = rib_neck,
                                     rib_head = rib_head, rib_pitch = rib_pitch, seg_l = seg_l, rib_gap = rib_gap,
                                     rib_inset = rib_inset, ribs = ribs, rib_dir = rib_dir);
            }
            for (h = holes) translate([h[0], h[1], -1]) cylinder(d = hole_d, h = base_t + 2, $fn = 32);
        }
        translate([0, 0, base_t])
            skin_tpu_region(size = size, skin_t = skin_t, lip_t = lip_t, lip_w = lip_w, rim_w = rim_w,
                            proud = proud, ch = ch, r = r);
    }
}

// Peel coupon: plate (grip end at x = 0) + pad + TPU tab over the far rim,
// down the plate end and along the bed. Clamp the plate, pull the tail up.
module skin_peel_coupon(part, size = [35, 12], base_t = 3, skin_t = 2.0, lip_t = 1.2, lip_w = 1.6,
                        rim_w = 2.0, proud = 1.0, ch = 0.6, r = 3,
                        rib_h = anchor_depth, rib_neck = anchor_neck, rib_head = anchor_head,
                        rib_pitch = 4.0, seg_l = 5.0, rib_gap = 1.6, rib_inset = 2.0, ribs = true,
                        grip_l = 15, tab_t = 1.6, tail_l = 40, tab_overlap = 8, tab_wall = 2, hole_d = 6,
                        rib_dir = "auto") {
    L = grip_l + size[0] + 2 * rim_w;        // plate length
    W = size[1] + 2 * rim_w;                 // plate width
    cx = L - rim_w - size[0] / 2;            // pad centre
    H = skin_t + lip_t;
    tw = size[1];                            // tab width (12 mm, as coupon P)
    top = base_t + H + tab_t;
    x_tab = cx + size[0] / 2 - tab_overlap;  // where the tab joins the pad top
    assert(grip_l >= hole_d + 2 * min_petg, "grip_l too short for the clamp hole");
    assert(tab_overlap > lip_w && tab_overlap < size[0], "tab_overlap must reach past the lip and stay on the pad");
    hybrid(part) {
        difference() {
            union() {
                translate([0, -W / 2, 0]) cube([L, W, base_t]);
                translate([cx, 0, base_t])
                    skin_anchor_petg(size = size, skin_t = skin_t, lip_t = lip_t, lip_w = lip_w, rim_w = rim_w,
                                     proud = proud, ch = ch, r = r, rib_h = rib_h, rib_neck = rib_neck,
                                     rib_head = rib_head, rib_pitch = rib_pitch, seg_l = seg_l, rib_gap = rib_gap,
                                     rib_inset = rib_inset, ribs = ribs, rib_dir = rib_dir);
            }
            translate([min(8, grip_l / 2), 0, -1]) cylinder(d = hole_d, h = base_t + 2, $fn = 40);
        }
        difference() {
            union() {
                translate([cx, 0, base_t])
                    skin_tpu_region(size = size, skin_t = skin_t, lip_t = lip_t, lip_w = lip_w, rim_w = rim_w,
                                    proud = proud, ch = ch, r = r);
                // tab over the far rim (fills down to the plate where the rim corners round off)
                translate([x_tab, -tw / 2, base_t]) cube([L - x_tab + eps, tw, H + tab_t]);
                // down the plate end, then flat along the bed
                translate([L, -tw / 2, 0]) cube([tab_wall, tw, top]);
                translate([L, -tw / 2, 0]) cube([tail_l, tw, tab_t]);
            }
            translate([L + tail_l - 7, 0, -1]) cylinder(d = hole_d, h = tab_t + 2, $fn = 40);
        }
    }
}

// -----------------------------------------------------------------------
// Demo: a grippy foot pad with two M3 holes. Test: the peel coupon.
// -----------------------------------------------------------------------
if (show == "demo")
    skin_pad(part, size = [40, 20], margin = [8, 0], holes = [[-26, 0], [26, 0]]);
else if (show == "test")
    skin_peel_coupon(part);
